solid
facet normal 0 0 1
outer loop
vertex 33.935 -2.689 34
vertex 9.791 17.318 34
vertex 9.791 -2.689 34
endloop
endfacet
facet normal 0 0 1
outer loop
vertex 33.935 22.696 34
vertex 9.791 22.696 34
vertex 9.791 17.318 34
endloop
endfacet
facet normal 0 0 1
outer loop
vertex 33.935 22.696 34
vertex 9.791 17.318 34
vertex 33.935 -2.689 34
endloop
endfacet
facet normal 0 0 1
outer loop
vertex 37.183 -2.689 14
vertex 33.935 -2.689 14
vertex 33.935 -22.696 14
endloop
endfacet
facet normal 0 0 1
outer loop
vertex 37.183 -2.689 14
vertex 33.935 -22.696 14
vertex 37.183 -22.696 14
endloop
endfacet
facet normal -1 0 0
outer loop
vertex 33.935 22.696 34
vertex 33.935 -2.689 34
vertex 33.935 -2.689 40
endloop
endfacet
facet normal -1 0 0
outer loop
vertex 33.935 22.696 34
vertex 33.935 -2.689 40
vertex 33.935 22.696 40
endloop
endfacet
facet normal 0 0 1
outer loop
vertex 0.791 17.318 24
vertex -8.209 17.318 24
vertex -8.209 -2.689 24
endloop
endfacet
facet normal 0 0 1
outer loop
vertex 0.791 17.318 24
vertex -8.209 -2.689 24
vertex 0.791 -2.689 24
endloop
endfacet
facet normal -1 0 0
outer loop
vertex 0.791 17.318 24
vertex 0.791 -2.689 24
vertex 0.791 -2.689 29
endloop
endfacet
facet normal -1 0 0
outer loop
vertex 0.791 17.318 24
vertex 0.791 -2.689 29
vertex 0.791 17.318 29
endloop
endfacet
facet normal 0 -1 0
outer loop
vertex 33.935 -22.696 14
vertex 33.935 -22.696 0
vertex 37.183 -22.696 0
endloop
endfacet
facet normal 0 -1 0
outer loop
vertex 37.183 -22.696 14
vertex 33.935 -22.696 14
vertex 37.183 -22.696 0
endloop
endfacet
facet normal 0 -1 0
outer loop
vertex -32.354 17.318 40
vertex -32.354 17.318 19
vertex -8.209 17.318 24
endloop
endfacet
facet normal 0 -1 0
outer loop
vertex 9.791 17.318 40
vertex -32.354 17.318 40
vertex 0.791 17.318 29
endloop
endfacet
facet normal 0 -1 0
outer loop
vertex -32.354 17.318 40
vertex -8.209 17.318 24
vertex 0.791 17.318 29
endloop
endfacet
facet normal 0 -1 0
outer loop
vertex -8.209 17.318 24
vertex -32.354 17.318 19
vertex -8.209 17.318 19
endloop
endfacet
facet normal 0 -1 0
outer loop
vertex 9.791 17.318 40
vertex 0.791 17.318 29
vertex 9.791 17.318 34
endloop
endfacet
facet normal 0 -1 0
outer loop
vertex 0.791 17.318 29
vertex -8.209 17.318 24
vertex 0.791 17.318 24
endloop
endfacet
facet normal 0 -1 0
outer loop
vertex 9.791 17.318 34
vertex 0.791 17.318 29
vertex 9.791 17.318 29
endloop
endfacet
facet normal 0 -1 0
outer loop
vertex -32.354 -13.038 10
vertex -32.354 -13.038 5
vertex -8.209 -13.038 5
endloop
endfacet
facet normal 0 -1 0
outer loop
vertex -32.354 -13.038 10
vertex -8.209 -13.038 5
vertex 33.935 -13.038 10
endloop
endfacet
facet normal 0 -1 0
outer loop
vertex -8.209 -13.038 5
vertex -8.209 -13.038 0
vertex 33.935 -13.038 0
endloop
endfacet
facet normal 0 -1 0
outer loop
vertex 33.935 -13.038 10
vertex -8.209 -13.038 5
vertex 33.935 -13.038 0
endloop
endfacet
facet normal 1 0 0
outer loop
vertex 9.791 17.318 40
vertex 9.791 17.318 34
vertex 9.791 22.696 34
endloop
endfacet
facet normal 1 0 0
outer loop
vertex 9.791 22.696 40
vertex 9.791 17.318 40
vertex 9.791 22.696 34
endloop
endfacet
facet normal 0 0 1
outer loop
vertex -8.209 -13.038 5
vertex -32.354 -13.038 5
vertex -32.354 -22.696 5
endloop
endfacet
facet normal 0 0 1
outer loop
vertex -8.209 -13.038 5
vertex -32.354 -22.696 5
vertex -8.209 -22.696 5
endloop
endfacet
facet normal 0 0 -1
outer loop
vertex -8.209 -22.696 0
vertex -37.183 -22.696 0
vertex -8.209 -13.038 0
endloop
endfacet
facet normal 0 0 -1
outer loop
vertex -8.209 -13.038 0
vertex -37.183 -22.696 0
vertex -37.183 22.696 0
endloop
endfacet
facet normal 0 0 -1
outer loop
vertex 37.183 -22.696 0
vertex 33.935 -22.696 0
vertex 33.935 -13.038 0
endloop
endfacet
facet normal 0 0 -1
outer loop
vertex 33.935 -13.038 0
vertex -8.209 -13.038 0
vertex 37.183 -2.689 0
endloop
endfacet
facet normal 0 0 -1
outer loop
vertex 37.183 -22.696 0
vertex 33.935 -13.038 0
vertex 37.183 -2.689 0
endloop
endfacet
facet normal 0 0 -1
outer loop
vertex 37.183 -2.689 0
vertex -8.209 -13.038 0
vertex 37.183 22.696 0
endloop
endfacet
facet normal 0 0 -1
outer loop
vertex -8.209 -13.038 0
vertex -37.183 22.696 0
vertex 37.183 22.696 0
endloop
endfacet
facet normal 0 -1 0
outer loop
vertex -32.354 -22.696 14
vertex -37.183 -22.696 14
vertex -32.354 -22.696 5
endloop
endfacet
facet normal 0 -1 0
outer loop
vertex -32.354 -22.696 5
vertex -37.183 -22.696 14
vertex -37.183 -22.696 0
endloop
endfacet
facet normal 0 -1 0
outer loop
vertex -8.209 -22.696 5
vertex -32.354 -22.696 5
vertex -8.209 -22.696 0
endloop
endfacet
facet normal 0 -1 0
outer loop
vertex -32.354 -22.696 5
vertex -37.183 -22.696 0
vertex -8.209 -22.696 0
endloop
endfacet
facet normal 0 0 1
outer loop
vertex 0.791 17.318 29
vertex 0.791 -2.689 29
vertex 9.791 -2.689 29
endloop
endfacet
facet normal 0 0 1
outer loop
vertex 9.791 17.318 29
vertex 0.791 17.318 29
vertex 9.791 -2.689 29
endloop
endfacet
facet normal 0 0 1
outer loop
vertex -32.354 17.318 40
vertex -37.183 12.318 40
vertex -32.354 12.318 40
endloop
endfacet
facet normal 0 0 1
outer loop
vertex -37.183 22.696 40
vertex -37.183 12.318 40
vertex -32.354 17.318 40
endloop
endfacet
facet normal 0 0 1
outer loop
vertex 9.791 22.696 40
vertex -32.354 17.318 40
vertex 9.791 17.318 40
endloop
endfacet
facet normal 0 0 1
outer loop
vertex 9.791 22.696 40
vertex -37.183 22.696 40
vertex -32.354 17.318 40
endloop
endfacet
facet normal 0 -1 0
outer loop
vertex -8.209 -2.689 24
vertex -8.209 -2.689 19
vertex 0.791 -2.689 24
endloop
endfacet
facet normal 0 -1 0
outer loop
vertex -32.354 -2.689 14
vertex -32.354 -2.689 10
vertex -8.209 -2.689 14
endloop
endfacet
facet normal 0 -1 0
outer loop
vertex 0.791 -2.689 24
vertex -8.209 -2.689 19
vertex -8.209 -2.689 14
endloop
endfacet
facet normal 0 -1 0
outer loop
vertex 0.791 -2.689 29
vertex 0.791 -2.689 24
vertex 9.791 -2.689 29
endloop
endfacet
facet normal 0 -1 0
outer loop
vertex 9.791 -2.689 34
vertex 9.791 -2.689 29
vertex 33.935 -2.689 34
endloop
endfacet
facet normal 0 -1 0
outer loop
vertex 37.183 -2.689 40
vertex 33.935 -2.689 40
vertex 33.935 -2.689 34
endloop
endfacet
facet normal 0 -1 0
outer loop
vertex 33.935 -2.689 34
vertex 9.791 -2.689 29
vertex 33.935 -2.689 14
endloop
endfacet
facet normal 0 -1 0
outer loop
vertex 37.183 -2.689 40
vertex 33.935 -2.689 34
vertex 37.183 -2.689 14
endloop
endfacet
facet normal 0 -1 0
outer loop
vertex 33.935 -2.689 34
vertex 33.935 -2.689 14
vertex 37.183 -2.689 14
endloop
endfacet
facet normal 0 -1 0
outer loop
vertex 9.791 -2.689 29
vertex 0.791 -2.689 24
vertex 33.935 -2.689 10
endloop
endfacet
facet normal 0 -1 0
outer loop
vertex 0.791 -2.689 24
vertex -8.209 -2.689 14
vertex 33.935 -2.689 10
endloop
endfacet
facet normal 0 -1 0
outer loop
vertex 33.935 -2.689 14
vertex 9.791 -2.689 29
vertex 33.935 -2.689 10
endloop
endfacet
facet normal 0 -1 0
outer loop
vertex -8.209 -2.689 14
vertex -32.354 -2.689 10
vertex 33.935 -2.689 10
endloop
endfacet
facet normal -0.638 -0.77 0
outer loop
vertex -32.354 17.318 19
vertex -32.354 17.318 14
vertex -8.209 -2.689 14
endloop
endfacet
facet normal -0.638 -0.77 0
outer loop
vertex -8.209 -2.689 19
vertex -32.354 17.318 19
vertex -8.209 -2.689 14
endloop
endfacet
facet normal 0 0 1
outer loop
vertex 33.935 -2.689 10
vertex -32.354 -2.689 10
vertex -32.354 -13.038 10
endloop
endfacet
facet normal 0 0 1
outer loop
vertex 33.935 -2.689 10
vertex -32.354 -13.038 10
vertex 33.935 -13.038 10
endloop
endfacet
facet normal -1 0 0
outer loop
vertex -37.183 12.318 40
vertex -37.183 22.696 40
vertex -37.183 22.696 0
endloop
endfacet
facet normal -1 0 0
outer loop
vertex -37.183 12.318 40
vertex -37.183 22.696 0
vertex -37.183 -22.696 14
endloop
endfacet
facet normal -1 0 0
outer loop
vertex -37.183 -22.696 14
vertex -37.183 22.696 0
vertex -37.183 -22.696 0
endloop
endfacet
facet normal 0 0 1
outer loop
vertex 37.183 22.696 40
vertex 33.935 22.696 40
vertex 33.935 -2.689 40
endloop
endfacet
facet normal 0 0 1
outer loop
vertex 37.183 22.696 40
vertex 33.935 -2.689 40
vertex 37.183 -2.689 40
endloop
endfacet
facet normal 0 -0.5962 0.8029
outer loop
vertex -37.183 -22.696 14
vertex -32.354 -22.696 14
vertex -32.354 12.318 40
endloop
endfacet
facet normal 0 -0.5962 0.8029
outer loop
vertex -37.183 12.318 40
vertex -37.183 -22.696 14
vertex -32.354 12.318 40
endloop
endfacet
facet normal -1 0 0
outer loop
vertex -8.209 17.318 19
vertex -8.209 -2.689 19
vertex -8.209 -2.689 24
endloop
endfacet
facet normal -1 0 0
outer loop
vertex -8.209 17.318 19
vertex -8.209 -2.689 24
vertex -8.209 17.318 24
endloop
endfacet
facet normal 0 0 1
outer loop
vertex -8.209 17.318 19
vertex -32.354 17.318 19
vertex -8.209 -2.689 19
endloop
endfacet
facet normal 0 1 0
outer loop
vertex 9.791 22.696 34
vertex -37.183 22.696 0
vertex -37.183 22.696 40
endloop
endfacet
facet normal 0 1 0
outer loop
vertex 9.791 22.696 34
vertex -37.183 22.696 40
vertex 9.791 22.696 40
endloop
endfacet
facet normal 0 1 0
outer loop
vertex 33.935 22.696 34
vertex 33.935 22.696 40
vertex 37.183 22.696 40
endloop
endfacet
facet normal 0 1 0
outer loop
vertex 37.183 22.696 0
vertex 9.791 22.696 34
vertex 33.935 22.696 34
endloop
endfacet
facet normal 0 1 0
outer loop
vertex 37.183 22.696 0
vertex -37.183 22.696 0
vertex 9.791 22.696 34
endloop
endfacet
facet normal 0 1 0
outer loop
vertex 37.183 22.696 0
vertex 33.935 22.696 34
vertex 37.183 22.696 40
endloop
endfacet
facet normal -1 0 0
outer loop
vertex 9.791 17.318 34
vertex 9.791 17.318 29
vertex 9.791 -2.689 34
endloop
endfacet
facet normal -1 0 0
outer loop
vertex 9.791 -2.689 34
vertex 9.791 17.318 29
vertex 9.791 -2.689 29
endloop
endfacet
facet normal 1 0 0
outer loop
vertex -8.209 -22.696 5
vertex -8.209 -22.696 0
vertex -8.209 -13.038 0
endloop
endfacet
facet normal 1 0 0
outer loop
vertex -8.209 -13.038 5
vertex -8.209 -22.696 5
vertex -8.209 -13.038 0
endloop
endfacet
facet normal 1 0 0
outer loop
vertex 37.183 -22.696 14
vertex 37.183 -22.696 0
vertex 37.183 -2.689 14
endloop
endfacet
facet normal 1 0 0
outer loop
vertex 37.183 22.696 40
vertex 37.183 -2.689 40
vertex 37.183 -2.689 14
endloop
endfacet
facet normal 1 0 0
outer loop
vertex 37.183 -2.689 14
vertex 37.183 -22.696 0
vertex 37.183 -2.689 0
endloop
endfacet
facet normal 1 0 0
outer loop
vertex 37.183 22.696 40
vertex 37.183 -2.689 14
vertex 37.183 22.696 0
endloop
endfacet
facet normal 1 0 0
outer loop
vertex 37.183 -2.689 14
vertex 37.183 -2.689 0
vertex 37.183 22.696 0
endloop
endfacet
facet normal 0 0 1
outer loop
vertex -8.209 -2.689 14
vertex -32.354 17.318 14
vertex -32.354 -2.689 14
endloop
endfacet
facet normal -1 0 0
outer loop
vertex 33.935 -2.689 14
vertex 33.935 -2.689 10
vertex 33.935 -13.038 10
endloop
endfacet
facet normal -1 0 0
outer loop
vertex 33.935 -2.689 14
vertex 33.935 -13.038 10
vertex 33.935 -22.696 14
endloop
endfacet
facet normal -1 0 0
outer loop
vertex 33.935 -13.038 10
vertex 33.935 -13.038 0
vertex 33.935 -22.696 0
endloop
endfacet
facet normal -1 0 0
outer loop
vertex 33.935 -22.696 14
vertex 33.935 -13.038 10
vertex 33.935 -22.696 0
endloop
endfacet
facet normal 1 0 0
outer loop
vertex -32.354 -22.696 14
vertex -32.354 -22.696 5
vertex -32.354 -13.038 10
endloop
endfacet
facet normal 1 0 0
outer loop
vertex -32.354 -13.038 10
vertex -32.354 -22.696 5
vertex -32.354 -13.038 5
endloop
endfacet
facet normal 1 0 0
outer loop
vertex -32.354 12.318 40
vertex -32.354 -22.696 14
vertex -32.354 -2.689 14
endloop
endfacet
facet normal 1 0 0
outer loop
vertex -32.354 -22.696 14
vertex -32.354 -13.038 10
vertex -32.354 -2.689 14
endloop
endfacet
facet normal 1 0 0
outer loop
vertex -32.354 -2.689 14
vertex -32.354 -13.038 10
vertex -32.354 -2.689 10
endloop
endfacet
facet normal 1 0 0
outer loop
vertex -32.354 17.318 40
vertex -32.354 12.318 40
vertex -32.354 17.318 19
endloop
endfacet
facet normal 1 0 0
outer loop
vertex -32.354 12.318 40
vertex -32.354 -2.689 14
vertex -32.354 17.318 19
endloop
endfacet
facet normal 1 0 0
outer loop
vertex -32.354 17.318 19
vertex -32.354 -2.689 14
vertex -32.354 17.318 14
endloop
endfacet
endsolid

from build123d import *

# Parameters (mm, degrees)
F1_DEPTH  = 40
F3_DEPTH  = 25
F4_DEPTH  = 40
F5_DEPTH  = 14
F6_DEPTH  = 19
F0_W      = 9
F0_H      = 20.0069169636
F7_DEPTH  = 24
F8_DEPTH  = 29
F9_DEPTH  = 34
F10_DEPTH = 10
F0_W_2    = 24.1446838646
F0_H_2    = 9.6578735458
F11_DEPTH = 5
F0_W_3    = 3.2473218008
F0_H_3    = 25.3850887019
F12_DEPTH = 40
F13_DEPTH = 14


with BuildPart() as f1:
    # F0 (on Top) → F1 (new body)
    with BuildSketch(Plane.XY):
        Polygon((-37.1828131515, 17.3178310944), (-37.1828131515, -22.6960028327), (-32.3538763785, -22.6960028327), (-32.3538763785, -13.0381292869), (-32.3538763785, -2.6890858691), (-32.3538763785, 17.3178310944), align=None)
    extrude(amount=F1_DEPTH)

    # F2 (on face) → F3 (cut)
    with BuildSketch(Plane.YZ.offset(-32.3538763785)):
        Polygon((-22.6960028327, 40), (-22.6960028327, 14), (12.3178310944, 40), align=None)
    extrude(amount=-F3_DEPTH, mode=Mode.SUBTRACT)

    # F0 (on Top) → F4 (join)
    with BuildSketch(Plane.XY):
        Polygon((-37.1828131515, 22.6960028327), (-37.1828131515, 17.3178310944), (-32.3538763785, 17.3178310944), (-8.209192514, 17.3178310944), (0.790807486, 17.3178310944), (9.790807486, 17.3178310944), (9.790807486, 22.6960028327), align=None)
    extrude(amount=F4_DEPTH)

    # F0 (on Top) → F5 (join)
    with BuildSketch(Plane.XY):
        Polygon((-8.209192514, -2.6890858691), (-32.3538763785, 17.3178310944), (-32.3538763785, -2.6890858691), align=None)
    extrude(amount=F5_DEPTH)

    # F0 (on Top) → F6 (join)
    with BuildSketch(Plane.XY):
        Polygon((-8.209192514, 17.3178310944), (-32.3538763785, 17.3178310944), (-8.209192514, -2.6890858691), align=None)
    extrude(amount=F6_DEPTH)

    # F0 (on Top) → F7 (join)
    with BuildSketch(Plane.XY):
        with Locations((-3.709192514, 7.3143726126)):
            Rectangle(F0_W, F0_H)
    extrude(amount=F7_DEPTH)

    # F0 (on Top) → F8 (join)
    with BuildSketch(Plane.XY):
        with Locations((5.290807486, 7.3143726126)):
            Rectangle(F0_W, F0_H)
    extrude(amount=F8_DEPTH)

    # F0 (on Top) → F9 (join)
    with BuildSketch(Plane.XY):
        Polygon((33.9354913506, 22.6960028327), (9.790807486, 22.6960028327), (9.790807486, 17.3178310944), (9.790807486, -2.6890858691), (33.9354913506, -2.6890858691), align=None)
    extrude(amount=F9_DEPTH)

    # F0 (on Top) → F10 (join)
    with BuildSketch(Plane.XY):
        Polygon((-32.3538763785, -2.6890858691), (-32.3538763785, -13.0381292869), (-8.209192514, -13.0381292869), (33.9354913506, -13.0381292869), (33.9354913506, -2.6890858691), (9.790807486, -2.6890858691), (0.790807486, -2.6890858691), (-8.209192514, -2.6890858691), align=None)
    extrude(amount=F10_DEPTH)

    # F0 (on Top) → F11 (join)
    with BuildSketch(Plane.XY):
        with Locations((-20.2815344463, -17.8670660598)):
            Rectangle(F0_W_2, F0_H_2)
    extrude(amount=F11_DEPTH)

    # F0 (on Top) → F12 (join)
    with BuildSketch(Plane.XY):
        with Locations((35.559152251, 10.0034584818)):
            Rectangle(F0_W_3, F0_H_3)
    extrude(amount=F12_DEPTH)

    # F0 (on Top) → F13 (join)
    with BuildSketch(Plane.XY):
        Polygon((33.9354913506, -2.6890858691), (33.9354913506, -13.0381292869), (33.9354913506, -22.6960028327), (37.1828131515, -22.6960028327), (37.1828131515, -2.6890858691), align=None)
    extrude(amount=F13_DEPTH)


solid = f1.part
